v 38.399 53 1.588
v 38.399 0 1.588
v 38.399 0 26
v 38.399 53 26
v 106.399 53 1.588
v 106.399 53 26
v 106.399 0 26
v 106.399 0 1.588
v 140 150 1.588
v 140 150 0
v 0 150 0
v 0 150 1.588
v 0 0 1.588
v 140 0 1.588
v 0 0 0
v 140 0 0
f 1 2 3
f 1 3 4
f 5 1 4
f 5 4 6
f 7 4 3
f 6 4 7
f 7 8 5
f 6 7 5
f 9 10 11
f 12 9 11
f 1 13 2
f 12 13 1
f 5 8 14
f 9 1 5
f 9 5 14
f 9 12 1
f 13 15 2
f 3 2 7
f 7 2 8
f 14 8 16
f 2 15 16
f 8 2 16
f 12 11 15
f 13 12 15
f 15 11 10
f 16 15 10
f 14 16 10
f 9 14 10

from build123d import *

# Parameters (mm, degrees)
F0_W     = 68
F0_H     = 53
F1_DEPTH = 1.5875
F2_DEPTH = 26


# Not quite as in the source:
# - a length typed as a fraction of an inch, garbled in the dataset ("3 / 203.2 mm" for 3/8 in), is restored


with BuildPart() as f1:
    # F0 (on Top) → F1 (new body)
    with BuildSketch(Plane.XY):
        Polygon((0, 150), (0, 0), (38.399413228, 0), (38.399413228, 53), (106.399413228, 53), (106.399413228, 0), (140, 0), (140, 150), align=None)
        with Locations((72.399413228, 26.5)):
            Rectangle(F0_W, F0_H)
    extrude(amount=F1_DEPTH)

    # F0 (on Top) → F2 (join)
    with BuildSketch(Plane.XY):
        with Locations((72.399413228, 26.5)):
            Rectangle(F0_W, F0_H)
    extrude(amount=F2_DEPTH)


solid = f1.part
